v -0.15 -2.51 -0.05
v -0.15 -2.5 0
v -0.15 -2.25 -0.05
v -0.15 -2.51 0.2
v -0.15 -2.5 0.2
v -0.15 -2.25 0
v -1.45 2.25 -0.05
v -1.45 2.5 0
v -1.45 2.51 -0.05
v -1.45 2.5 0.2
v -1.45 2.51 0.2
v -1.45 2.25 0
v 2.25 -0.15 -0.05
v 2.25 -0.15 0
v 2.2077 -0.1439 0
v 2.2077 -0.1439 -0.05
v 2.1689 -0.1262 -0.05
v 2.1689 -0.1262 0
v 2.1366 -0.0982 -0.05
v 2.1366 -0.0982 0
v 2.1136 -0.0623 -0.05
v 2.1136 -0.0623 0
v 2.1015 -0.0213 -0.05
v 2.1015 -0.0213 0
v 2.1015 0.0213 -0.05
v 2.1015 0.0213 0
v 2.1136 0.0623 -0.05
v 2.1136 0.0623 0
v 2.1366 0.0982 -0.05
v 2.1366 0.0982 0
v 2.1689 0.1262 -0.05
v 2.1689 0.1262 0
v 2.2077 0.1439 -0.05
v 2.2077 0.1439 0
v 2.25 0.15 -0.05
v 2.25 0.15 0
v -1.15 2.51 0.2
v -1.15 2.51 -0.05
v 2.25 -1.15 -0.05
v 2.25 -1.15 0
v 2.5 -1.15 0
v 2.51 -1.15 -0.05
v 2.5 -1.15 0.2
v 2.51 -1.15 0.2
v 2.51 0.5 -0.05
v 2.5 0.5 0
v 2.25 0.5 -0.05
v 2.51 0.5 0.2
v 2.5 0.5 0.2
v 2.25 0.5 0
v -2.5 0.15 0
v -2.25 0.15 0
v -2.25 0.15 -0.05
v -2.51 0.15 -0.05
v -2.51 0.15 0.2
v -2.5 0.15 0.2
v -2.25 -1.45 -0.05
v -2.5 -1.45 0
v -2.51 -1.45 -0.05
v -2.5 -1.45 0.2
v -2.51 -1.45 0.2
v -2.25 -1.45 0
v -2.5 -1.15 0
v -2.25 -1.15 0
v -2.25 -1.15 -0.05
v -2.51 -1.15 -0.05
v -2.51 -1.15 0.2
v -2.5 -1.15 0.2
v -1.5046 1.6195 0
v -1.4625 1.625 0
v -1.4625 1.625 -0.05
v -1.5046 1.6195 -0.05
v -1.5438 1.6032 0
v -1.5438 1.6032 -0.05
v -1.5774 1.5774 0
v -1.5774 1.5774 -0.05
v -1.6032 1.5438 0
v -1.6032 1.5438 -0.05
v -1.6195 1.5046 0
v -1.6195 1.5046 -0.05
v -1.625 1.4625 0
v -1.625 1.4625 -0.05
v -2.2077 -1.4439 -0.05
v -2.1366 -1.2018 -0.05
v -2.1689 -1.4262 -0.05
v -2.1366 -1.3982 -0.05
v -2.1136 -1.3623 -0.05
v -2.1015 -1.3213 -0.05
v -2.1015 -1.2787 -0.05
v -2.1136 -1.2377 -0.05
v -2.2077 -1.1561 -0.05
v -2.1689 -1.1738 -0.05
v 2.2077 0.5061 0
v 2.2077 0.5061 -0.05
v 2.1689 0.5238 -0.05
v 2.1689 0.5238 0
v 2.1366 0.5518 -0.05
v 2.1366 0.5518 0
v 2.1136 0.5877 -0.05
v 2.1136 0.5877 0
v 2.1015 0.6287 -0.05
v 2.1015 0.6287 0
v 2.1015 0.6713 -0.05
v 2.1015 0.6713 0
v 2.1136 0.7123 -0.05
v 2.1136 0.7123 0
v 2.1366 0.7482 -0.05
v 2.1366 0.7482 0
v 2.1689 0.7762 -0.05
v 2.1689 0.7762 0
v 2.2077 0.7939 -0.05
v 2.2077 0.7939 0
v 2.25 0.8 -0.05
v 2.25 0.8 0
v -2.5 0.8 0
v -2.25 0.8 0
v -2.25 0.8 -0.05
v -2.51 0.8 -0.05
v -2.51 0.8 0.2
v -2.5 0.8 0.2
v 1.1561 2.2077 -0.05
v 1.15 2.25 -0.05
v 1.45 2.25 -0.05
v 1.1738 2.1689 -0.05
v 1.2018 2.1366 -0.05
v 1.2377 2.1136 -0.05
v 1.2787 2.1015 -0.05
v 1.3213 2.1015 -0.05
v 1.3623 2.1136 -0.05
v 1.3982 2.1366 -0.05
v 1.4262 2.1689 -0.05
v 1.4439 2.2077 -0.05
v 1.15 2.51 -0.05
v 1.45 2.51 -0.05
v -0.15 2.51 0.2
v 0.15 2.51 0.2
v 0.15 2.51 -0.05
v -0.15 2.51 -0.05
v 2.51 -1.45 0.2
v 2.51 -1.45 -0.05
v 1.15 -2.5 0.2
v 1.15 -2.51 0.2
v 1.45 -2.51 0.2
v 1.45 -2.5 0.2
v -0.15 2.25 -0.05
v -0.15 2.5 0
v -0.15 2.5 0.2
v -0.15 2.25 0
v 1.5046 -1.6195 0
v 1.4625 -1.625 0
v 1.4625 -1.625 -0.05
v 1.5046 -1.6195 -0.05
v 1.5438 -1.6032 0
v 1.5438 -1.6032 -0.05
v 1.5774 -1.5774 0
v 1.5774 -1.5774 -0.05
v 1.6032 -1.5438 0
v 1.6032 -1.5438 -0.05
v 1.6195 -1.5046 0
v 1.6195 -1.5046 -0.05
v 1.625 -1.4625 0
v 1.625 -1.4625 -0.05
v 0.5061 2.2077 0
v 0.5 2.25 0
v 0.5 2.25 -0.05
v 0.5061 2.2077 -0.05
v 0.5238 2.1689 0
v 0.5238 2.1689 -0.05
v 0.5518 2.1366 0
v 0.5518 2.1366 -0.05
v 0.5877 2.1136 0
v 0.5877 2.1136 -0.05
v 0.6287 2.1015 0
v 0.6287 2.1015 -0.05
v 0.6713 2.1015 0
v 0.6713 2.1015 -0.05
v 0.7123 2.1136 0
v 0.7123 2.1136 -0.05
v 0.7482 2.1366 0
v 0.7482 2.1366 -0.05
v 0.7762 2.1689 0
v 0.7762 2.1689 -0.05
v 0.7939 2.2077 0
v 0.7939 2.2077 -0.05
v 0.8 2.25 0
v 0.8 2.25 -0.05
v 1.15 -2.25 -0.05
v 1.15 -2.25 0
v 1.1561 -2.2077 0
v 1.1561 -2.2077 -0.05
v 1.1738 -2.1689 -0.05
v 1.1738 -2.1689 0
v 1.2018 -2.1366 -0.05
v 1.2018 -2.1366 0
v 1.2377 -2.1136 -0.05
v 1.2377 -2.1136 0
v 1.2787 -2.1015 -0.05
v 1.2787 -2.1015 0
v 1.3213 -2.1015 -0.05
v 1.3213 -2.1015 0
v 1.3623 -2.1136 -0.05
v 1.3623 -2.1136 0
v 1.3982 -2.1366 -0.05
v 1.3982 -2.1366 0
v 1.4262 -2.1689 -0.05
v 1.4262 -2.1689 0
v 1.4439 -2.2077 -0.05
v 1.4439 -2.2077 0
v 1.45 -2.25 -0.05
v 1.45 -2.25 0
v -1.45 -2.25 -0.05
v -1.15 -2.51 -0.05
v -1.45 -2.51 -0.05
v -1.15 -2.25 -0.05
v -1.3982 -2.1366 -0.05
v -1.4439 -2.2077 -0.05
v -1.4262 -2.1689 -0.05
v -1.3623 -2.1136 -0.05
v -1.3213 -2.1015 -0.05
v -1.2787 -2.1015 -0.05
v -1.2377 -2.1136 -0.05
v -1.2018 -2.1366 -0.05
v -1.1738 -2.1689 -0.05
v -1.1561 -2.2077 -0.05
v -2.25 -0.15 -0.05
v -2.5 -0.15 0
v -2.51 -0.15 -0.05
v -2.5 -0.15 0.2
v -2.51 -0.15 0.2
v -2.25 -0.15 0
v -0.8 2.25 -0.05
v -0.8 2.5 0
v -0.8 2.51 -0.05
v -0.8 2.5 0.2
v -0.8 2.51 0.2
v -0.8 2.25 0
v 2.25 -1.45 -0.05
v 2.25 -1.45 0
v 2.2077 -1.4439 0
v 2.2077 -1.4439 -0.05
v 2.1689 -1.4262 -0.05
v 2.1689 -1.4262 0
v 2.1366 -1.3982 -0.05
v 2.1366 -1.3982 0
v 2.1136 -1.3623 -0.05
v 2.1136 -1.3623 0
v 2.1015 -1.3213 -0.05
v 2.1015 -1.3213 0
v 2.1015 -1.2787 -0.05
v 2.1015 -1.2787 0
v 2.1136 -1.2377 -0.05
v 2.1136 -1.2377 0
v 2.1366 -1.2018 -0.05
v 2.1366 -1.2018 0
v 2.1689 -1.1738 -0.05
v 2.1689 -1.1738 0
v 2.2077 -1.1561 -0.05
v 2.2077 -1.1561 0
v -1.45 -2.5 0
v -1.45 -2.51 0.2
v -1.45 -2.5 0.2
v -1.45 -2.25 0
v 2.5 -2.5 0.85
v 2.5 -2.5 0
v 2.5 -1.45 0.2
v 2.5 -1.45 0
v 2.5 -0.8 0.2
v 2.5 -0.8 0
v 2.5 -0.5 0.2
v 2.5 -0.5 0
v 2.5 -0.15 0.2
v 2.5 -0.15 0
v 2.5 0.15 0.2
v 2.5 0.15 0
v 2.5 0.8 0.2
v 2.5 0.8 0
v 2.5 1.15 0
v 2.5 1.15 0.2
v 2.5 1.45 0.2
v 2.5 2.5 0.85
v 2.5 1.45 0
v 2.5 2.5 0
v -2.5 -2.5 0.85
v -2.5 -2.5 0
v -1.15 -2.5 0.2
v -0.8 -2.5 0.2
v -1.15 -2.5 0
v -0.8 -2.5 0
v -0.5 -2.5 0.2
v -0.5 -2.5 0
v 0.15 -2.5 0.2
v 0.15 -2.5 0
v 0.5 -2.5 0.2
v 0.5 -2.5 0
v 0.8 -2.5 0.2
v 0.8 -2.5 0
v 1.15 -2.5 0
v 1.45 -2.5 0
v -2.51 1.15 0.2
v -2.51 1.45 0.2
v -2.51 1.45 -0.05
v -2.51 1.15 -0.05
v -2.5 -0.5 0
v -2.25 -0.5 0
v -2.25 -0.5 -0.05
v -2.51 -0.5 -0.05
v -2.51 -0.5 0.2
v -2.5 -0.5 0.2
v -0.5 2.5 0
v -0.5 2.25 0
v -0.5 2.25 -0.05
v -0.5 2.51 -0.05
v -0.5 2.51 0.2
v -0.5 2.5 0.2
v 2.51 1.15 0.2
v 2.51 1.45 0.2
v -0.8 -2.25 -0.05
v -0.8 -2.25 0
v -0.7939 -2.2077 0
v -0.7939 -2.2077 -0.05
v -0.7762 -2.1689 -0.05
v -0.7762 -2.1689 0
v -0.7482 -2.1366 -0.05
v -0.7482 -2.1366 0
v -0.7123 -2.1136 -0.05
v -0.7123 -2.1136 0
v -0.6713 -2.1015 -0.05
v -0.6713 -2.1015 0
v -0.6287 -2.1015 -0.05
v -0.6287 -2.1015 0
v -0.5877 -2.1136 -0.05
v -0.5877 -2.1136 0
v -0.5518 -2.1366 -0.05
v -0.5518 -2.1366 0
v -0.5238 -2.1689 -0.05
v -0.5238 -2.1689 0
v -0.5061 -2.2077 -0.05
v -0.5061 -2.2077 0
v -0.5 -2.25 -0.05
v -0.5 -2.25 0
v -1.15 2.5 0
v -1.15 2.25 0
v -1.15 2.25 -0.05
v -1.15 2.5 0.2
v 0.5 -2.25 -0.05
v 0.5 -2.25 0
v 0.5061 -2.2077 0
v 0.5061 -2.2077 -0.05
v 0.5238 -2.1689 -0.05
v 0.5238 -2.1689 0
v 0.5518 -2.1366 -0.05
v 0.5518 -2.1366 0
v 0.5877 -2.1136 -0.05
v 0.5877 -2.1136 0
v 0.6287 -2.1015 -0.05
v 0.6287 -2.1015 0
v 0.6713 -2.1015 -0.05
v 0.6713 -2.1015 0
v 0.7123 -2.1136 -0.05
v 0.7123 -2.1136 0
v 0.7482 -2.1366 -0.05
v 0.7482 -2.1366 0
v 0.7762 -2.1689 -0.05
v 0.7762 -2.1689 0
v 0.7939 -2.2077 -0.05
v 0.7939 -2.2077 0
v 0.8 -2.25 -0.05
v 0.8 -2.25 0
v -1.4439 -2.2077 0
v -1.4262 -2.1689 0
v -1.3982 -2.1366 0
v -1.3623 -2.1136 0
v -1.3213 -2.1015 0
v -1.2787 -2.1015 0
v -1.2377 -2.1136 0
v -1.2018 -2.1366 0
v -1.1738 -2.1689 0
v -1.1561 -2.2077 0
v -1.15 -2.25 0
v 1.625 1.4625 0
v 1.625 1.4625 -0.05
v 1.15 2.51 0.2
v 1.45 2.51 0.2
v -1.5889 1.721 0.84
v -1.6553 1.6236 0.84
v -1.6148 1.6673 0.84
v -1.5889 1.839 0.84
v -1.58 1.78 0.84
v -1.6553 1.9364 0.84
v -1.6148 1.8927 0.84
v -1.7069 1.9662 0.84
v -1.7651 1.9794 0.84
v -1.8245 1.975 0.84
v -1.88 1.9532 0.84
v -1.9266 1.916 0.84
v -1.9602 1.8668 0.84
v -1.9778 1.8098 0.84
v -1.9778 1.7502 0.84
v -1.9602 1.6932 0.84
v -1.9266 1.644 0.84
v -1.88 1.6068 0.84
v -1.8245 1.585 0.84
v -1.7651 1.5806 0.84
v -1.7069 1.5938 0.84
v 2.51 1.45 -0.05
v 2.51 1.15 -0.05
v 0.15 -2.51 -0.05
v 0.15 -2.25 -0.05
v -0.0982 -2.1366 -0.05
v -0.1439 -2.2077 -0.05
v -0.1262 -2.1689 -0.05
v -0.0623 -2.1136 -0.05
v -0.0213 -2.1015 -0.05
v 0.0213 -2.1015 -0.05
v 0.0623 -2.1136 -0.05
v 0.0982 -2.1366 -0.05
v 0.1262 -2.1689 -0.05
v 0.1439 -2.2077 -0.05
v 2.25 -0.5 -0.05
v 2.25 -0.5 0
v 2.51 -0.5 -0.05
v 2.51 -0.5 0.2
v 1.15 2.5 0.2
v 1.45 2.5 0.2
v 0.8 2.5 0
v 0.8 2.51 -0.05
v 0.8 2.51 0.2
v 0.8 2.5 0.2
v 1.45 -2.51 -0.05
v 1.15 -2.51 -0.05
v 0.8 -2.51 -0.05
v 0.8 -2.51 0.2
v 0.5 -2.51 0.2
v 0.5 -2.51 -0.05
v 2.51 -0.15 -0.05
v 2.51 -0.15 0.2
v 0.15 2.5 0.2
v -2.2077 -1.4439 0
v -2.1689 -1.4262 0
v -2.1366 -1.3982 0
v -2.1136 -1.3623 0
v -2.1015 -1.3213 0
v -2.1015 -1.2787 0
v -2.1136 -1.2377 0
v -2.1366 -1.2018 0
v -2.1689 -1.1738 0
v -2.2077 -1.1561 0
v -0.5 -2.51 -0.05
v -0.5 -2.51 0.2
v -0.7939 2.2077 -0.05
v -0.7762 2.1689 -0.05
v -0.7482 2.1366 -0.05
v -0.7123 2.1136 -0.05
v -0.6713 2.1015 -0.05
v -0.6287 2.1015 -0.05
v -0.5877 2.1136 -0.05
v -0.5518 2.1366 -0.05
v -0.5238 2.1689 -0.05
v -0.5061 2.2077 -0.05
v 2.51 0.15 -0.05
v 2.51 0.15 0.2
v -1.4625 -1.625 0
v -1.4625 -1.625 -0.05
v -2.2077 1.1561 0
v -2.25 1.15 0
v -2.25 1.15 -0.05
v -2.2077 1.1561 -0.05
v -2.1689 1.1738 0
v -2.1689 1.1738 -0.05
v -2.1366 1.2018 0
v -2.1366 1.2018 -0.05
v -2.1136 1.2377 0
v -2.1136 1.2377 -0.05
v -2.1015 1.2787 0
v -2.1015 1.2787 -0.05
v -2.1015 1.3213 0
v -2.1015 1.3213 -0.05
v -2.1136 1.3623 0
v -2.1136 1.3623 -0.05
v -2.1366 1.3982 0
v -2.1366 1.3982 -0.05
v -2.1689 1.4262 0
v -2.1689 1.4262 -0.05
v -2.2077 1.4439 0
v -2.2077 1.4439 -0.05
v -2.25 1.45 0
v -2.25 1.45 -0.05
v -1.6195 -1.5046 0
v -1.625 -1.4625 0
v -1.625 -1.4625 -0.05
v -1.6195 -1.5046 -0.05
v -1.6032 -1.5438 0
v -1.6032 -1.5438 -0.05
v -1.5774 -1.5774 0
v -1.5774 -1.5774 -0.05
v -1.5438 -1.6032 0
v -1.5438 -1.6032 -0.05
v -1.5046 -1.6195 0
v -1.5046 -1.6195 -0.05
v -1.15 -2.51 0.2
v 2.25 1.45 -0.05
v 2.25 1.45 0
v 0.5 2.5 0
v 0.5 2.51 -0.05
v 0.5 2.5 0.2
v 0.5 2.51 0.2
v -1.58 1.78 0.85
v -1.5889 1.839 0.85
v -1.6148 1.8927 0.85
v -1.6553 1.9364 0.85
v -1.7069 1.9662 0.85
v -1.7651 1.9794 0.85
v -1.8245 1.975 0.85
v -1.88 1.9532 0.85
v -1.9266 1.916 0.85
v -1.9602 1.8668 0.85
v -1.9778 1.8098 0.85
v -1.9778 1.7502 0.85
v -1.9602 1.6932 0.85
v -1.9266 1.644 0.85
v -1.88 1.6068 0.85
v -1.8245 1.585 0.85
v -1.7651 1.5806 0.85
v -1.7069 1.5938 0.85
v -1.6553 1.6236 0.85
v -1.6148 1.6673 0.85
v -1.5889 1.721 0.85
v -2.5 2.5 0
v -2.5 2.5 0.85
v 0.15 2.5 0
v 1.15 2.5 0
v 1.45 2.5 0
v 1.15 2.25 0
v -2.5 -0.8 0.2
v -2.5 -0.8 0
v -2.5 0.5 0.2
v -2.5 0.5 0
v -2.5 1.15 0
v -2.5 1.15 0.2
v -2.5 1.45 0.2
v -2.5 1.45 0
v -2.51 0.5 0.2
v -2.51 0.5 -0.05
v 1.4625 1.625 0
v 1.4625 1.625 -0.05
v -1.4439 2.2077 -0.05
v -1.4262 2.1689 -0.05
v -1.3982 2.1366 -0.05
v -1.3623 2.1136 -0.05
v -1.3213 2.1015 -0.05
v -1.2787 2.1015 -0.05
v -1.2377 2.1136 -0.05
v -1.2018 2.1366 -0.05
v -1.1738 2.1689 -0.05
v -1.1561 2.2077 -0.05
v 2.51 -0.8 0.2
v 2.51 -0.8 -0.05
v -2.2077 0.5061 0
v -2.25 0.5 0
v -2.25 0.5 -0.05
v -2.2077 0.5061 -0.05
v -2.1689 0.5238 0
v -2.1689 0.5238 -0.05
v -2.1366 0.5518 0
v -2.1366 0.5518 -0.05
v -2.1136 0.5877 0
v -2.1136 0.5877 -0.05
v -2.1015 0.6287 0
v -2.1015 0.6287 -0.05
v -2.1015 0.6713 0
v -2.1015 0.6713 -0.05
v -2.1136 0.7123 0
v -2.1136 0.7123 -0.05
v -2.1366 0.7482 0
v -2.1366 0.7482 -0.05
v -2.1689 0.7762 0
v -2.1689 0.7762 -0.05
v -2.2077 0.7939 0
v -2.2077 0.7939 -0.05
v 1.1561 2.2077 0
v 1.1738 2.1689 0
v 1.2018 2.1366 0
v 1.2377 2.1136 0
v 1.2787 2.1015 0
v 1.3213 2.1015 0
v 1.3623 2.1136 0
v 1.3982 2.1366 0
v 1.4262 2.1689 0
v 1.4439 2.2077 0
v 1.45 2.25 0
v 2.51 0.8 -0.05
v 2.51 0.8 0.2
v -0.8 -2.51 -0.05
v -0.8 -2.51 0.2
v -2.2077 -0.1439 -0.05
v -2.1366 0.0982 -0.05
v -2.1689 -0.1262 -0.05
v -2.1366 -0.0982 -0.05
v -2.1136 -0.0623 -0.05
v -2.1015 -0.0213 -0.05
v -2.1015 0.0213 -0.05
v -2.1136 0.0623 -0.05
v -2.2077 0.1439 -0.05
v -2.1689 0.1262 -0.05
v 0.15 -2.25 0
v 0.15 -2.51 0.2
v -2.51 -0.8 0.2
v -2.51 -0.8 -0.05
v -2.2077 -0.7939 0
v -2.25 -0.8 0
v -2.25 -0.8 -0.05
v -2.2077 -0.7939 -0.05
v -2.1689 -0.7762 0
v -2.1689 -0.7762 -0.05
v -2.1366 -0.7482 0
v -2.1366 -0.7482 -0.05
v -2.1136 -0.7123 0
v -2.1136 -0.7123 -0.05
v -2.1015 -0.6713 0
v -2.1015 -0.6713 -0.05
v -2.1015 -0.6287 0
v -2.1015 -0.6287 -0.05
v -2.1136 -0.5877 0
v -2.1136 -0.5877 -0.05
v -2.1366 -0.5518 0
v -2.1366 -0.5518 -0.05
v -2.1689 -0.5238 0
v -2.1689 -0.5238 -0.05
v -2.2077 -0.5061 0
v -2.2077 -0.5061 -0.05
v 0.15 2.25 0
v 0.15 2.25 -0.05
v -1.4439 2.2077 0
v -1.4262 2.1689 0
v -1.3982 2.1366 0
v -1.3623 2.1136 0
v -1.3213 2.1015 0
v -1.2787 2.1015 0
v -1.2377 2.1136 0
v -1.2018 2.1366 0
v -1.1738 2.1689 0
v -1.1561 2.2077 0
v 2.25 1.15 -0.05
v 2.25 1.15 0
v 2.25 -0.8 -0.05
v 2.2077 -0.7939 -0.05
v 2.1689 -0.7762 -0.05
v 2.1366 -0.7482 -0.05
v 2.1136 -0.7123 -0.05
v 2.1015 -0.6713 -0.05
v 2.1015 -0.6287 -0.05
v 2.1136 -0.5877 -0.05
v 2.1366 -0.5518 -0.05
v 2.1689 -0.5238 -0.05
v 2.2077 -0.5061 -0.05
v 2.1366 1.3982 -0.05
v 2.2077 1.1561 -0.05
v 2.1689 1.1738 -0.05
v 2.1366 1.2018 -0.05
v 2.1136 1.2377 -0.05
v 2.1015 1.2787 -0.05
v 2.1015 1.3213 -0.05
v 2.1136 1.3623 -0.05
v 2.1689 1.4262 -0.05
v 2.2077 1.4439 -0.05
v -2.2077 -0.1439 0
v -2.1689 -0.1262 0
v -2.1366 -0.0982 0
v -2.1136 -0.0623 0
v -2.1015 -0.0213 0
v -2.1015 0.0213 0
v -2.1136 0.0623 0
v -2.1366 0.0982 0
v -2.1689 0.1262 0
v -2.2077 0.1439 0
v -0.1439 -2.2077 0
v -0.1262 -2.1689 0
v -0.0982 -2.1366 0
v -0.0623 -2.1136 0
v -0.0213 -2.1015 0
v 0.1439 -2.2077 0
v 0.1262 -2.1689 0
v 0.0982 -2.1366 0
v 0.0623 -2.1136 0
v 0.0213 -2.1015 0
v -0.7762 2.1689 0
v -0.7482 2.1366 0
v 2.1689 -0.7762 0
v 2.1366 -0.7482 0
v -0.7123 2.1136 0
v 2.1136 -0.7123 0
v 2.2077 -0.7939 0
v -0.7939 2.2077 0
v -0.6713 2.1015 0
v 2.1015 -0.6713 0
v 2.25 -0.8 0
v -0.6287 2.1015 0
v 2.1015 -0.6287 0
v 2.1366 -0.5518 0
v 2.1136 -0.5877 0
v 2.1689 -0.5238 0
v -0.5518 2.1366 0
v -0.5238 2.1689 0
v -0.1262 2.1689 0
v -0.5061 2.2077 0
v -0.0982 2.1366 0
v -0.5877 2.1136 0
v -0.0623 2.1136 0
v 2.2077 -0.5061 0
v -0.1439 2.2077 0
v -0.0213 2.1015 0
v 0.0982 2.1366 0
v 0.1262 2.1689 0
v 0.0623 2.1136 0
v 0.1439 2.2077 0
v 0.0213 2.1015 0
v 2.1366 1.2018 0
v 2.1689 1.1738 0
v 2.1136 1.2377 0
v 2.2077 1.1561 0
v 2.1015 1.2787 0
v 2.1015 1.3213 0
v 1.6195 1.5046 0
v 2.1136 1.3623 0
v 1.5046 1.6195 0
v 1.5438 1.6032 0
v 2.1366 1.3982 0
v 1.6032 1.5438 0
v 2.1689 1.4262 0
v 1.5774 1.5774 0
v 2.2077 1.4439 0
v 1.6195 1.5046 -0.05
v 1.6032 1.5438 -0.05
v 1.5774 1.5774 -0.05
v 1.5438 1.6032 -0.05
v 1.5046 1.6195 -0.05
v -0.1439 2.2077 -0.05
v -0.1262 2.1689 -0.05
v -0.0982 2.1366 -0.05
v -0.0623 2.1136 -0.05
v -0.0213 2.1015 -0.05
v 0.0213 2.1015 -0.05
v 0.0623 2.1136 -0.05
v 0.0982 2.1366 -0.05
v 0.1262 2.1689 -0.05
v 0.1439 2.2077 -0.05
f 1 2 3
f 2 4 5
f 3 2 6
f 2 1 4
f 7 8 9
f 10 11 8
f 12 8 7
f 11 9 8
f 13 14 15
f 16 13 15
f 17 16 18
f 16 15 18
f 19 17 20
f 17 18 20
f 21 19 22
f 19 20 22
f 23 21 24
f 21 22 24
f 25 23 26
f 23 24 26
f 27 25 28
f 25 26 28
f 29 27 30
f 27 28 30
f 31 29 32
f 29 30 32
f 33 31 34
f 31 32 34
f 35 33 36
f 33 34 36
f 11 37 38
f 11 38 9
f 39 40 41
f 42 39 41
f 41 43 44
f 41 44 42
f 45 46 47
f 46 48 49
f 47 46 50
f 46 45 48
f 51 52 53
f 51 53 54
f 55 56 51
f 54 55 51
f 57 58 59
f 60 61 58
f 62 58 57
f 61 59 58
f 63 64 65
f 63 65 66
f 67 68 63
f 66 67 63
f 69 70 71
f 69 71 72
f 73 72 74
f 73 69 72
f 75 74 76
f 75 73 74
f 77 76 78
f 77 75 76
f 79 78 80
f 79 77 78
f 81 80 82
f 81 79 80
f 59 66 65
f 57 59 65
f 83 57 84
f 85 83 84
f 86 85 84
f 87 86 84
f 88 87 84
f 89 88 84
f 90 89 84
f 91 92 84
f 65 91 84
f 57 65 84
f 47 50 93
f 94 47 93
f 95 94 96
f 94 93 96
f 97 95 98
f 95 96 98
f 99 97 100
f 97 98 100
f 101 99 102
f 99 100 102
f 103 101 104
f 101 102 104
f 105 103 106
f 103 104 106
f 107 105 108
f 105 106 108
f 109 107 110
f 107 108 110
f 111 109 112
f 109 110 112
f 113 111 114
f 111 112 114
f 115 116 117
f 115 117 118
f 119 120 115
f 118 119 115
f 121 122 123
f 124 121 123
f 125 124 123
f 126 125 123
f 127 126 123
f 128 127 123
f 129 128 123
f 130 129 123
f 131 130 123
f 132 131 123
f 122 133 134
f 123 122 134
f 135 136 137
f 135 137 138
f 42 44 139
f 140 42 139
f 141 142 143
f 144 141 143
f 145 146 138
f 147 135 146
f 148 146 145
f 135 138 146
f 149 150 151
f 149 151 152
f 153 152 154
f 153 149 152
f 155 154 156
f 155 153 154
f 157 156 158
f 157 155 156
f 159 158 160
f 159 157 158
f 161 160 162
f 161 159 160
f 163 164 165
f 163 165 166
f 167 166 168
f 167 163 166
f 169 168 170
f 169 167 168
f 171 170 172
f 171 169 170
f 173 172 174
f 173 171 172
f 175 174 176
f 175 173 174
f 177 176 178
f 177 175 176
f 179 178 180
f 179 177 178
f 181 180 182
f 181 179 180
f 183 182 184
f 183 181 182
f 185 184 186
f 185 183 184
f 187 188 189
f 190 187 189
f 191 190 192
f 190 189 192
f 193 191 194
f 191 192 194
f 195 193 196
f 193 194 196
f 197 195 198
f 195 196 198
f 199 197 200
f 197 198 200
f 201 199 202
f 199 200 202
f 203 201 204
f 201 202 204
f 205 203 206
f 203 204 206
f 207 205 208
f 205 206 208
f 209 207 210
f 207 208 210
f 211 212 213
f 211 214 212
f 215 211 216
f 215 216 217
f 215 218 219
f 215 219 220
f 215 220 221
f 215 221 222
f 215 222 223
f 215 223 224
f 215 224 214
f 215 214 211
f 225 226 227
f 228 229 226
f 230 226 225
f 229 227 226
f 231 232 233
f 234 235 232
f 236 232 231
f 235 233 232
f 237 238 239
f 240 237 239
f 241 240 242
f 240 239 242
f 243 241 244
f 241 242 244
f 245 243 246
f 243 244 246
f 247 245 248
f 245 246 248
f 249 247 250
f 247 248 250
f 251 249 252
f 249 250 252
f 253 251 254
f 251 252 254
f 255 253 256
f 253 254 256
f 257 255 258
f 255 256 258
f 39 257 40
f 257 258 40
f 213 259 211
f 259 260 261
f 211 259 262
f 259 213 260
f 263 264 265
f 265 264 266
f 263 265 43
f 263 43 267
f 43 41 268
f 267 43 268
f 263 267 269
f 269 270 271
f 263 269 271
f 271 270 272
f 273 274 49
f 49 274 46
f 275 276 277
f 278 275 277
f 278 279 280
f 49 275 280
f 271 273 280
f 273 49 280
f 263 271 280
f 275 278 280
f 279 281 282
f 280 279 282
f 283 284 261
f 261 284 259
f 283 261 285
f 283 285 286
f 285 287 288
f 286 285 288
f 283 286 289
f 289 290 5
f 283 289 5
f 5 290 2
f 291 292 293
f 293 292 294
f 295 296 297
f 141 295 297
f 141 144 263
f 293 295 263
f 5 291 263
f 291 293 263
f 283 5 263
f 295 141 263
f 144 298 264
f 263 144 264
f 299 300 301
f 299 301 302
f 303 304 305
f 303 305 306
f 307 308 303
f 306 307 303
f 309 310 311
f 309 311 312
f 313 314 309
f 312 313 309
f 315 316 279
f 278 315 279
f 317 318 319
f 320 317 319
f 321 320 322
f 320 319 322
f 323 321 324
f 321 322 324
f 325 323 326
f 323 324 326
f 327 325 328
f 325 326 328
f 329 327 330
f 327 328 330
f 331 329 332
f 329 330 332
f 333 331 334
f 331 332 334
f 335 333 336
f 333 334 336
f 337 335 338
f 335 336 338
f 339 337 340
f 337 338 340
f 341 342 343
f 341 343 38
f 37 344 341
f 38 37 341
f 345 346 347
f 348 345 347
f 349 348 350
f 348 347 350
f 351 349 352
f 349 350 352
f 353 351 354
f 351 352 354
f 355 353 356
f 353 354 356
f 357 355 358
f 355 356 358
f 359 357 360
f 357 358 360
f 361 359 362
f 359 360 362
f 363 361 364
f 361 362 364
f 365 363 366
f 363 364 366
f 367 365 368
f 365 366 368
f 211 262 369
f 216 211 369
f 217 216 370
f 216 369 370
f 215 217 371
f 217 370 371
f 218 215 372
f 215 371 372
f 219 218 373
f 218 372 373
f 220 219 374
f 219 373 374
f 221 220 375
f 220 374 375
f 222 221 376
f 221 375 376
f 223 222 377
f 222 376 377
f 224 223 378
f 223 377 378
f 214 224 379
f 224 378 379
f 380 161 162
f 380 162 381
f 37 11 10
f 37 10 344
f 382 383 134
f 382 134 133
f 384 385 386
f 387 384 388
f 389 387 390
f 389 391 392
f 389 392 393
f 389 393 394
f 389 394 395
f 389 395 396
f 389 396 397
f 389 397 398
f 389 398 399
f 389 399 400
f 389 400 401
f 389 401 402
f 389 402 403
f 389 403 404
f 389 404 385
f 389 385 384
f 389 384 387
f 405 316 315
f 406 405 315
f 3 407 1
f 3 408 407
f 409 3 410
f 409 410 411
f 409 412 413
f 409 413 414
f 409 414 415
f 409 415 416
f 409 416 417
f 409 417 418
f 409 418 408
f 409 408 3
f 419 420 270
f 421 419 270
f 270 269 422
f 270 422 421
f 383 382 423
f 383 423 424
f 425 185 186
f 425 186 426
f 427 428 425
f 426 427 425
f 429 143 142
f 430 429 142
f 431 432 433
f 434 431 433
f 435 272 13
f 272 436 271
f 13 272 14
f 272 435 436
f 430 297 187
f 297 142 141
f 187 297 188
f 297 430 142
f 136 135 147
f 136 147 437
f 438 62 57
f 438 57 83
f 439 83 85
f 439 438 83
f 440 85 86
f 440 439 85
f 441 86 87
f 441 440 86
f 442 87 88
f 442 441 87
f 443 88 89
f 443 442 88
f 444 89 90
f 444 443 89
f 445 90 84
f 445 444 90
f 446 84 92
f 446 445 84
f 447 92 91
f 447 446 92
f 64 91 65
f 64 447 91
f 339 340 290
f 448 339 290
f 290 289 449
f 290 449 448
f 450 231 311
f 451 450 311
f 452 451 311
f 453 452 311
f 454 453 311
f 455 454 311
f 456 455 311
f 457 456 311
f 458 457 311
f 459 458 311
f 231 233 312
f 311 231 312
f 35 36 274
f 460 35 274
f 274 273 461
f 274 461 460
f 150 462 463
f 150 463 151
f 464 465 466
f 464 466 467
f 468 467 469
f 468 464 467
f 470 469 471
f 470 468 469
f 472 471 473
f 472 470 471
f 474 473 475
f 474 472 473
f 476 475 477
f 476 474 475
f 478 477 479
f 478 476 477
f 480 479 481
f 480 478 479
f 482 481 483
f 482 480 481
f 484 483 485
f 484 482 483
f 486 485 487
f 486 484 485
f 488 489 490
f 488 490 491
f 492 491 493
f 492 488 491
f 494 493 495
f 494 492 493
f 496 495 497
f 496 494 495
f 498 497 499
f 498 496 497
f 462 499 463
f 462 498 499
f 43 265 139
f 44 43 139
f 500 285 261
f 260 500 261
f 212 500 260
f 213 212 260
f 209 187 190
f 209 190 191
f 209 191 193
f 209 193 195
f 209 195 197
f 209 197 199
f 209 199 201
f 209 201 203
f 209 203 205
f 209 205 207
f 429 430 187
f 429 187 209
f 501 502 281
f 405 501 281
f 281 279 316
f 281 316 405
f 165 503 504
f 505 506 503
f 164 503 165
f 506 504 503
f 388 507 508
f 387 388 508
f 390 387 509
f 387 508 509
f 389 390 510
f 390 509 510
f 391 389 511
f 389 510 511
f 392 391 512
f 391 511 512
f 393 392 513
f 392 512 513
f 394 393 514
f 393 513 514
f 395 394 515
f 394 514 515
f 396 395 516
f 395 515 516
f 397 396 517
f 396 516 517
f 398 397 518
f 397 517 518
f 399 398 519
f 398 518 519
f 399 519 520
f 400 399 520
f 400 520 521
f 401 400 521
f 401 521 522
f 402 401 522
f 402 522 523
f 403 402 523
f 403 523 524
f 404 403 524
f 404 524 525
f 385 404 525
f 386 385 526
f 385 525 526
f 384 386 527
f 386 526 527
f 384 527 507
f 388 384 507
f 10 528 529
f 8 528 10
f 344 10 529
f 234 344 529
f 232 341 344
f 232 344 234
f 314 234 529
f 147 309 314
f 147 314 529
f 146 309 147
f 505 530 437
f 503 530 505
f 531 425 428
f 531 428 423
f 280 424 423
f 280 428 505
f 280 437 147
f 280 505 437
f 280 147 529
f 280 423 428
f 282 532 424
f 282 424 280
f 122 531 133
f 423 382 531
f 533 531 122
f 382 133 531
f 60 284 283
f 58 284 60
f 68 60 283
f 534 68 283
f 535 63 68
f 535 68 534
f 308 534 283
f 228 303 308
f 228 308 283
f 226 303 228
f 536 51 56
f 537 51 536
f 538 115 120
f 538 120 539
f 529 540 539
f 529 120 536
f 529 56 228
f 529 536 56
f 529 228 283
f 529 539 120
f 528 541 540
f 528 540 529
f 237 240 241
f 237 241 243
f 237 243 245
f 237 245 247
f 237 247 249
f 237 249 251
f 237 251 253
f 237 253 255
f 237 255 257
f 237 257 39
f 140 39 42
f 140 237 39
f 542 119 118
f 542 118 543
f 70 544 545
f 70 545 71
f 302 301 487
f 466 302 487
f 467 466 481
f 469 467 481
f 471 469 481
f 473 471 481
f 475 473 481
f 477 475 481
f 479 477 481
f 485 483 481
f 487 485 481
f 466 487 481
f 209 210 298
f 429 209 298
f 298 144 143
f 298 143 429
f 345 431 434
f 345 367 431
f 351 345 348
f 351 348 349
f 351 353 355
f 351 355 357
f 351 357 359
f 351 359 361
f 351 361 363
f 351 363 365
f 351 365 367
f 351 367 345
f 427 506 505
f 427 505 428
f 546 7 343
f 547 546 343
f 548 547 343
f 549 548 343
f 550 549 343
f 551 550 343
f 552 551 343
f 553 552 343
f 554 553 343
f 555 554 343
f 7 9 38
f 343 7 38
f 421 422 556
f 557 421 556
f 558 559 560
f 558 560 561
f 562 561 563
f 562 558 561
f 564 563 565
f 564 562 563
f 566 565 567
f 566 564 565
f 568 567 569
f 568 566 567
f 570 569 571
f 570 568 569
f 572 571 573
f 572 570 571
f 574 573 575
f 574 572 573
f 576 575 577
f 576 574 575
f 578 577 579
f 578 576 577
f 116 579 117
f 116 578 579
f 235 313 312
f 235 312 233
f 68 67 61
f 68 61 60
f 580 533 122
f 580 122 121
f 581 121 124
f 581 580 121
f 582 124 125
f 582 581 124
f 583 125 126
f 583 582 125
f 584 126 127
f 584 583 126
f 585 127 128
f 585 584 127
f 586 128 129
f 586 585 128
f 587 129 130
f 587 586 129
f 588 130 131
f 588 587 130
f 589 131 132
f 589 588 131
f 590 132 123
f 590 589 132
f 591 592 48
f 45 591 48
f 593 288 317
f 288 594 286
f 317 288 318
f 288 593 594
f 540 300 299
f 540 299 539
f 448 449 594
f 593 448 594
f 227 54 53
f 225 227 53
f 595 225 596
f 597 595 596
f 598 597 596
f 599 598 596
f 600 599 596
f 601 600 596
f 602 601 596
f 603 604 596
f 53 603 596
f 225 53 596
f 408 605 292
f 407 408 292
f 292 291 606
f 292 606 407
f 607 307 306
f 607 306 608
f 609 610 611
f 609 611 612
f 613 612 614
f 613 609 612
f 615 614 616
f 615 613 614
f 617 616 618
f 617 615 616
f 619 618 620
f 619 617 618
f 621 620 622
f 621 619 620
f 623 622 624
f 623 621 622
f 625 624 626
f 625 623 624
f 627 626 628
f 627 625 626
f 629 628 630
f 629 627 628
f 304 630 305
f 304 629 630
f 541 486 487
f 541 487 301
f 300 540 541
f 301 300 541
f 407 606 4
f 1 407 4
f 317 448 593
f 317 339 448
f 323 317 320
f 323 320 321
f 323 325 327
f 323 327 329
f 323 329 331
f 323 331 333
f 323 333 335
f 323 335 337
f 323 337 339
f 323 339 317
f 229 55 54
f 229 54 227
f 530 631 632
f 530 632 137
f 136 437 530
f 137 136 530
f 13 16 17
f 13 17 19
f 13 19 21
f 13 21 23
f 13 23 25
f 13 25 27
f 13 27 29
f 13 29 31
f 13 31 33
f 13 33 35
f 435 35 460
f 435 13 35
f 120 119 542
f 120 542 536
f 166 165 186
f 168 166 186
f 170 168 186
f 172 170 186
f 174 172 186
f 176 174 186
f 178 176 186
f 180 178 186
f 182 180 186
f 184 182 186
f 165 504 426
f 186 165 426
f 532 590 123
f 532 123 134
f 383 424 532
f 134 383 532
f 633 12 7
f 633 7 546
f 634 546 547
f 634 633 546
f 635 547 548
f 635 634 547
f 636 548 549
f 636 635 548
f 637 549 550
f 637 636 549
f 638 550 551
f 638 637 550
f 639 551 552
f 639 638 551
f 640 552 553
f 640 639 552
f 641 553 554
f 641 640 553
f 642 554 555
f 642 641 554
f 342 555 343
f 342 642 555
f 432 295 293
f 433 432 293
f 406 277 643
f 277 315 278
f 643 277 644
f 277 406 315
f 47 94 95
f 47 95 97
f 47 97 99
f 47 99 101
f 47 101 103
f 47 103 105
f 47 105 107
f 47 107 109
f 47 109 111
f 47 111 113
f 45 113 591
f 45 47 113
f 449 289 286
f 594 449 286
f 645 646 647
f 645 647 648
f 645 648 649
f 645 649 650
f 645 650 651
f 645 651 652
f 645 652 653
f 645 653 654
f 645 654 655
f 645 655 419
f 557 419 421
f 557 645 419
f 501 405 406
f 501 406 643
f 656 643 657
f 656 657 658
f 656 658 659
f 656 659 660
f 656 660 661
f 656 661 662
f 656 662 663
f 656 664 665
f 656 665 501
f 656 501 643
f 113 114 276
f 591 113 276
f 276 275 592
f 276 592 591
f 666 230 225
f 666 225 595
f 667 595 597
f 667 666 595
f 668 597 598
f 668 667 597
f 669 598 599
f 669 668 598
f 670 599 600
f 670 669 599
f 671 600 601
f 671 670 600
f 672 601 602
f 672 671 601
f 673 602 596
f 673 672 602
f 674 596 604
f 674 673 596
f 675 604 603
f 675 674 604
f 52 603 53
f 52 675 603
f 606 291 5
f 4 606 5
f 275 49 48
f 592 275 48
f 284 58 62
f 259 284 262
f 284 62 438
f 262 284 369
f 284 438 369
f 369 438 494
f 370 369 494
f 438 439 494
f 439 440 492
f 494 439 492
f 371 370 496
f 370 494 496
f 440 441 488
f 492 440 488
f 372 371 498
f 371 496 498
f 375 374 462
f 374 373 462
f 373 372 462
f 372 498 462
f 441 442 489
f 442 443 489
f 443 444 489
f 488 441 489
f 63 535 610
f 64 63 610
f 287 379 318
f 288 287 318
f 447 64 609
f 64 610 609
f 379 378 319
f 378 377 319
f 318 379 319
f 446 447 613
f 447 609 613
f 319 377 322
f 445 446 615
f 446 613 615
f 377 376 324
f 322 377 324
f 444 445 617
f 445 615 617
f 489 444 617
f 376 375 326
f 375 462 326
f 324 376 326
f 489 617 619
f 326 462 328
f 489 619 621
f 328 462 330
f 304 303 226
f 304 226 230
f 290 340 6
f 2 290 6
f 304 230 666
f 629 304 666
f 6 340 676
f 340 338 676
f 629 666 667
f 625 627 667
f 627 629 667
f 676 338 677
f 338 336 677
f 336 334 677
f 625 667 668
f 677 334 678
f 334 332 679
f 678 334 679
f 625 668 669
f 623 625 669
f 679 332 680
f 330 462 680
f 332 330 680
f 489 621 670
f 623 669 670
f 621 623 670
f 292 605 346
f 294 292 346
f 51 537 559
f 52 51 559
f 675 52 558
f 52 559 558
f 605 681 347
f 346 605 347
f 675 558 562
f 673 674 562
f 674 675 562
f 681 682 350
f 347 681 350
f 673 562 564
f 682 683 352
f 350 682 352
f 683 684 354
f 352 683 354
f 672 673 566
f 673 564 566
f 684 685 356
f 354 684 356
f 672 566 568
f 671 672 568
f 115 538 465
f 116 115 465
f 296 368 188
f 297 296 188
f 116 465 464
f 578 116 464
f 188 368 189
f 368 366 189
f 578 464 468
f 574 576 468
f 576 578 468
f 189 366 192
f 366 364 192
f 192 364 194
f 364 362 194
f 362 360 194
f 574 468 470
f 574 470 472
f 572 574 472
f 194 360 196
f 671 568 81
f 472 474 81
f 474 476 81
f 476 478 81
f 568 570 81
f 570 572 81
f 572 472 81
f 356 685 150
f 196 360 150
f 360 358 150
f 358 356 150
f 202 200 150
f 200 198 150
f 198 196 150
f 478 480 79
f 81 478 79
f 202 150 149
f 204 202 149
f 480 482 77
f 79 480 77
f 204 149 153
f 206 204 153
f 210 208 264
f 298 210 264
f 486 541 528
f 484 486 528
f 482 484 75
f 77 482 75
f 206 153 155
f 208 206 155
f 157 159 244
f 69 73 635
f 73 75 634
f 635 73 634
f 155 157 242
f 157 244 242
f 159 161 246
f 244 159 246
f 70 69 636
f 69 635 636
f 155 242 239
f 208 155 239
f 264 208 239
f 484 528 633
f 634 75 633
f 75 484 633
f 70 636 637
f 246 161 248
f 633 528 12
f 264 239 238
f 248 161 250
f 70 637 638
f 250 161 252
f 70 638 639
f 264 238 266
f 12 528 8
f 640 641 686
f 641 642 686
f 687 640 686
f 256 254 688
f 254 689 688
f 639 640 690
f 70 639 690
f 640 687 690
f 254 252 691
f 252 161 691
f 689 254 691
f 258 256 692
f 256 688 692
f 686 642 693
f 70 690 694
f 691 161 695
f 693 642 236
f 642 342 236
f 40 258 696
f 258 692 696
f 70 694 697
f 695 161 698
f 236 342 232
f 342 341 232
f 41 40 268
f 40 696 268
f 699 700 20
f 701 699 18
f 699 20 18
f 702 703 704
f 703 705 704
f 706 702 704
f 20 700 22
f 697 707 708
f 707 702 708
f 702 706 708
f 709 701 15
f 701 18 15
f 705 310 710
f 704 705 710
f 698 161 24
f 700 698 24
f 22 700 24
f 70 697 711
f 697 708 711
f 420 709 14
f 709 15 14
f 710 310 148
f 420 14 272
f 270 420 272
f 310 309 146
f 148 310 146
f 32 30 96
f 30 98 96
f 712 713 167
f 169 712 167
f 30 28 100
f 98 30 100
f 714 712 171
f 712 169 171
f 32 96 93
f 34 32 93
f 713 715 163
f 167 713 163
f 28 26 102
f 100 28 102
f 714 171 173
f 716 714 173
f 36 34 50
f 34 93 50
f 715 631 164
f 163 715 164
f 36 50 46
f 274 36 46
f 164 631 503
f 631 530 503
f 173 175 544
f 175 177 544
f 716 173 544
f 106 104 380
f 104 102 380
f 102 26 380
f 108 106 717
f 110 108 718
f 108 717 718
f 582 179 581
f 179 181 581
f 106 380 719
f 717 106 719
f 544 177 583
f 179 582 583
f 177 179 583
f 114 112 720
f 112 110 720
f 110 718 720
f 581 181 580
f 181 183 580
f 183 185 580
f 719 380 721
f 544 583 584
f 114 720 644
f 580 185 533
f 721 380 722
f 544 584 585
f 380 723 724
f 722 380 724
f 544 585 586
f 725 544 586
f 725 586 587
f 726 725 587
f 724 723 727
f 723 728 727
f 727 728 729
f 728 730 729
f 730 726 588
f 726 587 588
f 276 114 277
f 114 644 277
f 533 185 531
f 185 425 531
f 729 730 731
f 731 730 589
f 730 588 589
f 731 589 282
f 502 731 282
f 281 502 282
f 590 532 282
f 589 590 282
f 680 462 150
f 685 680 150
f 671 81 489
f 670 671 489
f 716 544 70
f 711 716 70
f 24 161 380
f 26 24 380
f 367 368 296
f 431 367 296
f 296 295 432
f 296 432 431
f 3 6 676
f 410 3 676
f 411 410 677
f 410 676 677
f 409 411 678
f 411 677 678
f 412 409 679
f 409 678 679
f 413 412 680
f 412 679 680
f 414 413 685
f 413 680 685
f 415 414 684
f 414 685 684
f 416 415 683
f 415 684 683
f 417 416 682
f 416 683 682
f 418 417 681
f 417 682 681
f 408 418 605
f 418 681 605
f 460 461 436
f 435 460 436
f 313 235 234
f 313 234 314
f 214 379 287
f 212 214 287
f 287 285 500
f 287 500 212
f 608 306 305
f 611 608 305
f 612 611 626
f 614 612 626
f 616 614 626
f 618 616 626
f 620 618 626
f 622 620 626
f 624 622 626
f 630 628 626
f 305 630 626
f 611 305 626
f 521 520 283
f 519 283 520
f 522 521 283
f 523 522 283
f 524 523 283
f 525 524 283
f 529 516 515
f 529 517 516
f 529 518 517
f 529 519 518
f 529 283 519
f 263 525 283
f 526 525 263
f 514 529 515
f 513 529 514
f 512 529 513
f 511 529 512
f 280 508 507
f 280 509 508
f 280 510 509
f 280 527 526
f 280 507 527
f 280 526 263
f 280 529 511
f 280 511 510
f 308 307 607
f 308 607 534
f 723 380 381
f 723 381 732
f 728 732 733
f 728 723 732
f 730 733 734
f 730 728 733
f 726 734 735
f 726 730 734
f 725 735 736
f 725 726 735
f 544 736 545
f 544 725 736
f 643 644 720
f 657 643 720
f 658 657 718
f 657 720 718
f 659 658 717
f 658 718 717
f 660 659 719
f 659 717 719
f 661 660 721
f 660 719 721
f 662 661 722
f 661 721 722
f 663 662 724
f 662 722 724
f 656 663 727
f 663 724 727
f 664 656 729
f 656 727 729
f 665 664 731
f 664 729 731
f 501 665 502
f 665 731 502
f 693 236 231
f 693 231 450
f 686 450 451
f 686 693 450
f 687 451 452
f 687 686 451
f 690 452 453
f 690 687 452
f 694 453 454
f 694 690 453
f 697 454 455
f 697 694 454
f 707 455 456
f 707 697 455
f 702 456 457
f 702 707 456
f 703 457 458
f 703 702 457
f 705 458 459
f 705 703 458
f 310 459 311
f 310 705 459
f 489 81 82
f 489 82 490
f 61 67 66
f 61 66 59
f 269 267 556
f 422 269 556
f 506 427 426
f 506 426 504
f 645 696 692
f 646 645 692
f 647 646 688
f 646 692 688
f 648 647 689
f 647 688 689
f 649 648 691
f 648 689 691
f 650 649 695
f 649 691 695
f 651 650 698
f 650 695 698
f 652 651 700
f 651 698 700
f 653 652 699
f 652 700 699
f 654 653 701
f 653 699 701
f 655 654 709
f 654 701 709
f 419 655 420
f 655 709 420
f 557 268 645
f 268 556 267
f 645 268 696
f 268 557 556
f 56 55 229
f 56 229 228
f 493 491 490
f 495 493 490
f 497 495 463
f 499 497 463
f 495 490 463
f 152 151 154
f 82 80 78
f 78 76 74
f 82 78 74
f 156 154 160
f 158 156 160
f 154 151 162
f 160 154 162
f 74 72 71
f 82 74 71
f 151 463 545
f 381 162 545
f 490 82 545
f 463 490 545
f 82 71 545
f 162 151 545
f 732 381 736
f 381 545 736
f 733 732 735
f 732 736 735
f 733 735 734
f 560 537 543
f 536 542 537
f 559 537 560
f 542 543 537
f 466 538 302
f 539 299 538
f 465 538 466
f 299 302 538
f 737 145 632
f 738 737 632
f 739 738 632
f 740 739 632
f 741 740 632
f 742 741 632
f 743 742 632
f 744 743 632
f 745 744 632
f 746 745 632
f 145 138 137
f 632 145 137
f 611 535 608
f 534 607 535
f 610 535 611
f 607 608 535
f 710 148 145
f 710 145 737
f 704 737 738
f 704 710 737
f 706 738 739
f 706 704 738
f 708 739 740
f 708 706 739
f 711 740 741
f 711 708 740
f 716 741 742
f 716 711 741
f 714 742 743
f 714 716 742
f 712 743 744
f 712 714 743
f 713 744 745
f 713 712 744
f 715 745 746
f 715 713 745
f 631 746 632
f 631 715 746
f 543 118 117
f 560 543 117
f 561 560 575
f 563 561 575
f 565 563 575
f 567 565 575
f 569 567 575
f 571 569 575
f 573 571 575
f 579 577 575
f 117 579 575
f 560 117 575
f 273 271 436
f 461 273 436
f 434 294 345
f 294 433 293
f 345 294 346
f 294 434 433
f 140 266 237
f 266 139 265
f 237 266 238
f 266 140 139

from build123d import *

# Parameters (mm, degrees)
SKETCH1_W            = 5
SKETCH1_H            = 5
BOSS_EXTRUDE1_DEPTH  = 0.85
SKETCH2_R            = 0.2
CUT_EXTRUDE1_DEPTH   = 0.01
BOSS_EXTRUDE2_DEPTH  = 0.05
BOSS_EXTRUDE3_START  = -0.2
BOSS_EXTRUDE3_DEPTH  = 0.25
LPATTERN1_COUNT      = 5
LPATTERN1_PITCH      = 0.65
MIRROR1_START        = -0.2
MIRROR1_COPY_1_DEPTH = 0.25
MIRROR1_COPY_2_DEPTH = 0.25
MIRROR1_COPY_3_DEPTH = 0.25
MIRROR1_COPY_4_DEPTH = 0.25
BOSS_EXTRUDE4_START  = -0.2
BOSS_EXTRUDE4_DEPTH  = 0.25
LPATTERN2_COUNT      = 5
LPATTERN2_PITCH      = 0.65
MIRROR2_START        = -0.2
MIRROR2_COPY_1_DEPTH = 0.25
MIRROR2_COPY_2_DEPTH = 0.25
MIRROR2_COPY_3_DEPTH = 0.25
MIRROR2_COPY_4_DEPTH = 0.25


with BuildPart() as part:
    # Sketch1 → Boss-Extrude1 (new body)
    with BuildSketch(Plane.XY):
        Rectangle(SKETCH1_W, SKETCH1_H)
    extrude(amount=BOSS_EXTRUDE1_DEPTH)

    # Sketch2 → Cut-Extrude1 (cut)
    with BuildSketch(Plane.XY.offset(0.85)):
        with Locations((-1.78, 1.78)):
            Circle(SKETCH2_R)
    extrude(amount=-CUT_EXTRUDE1_DEPTH, mode=Mode.SUBTRACT)

    # Sketch3 → Boss-Extrude2 (add)
    with BuildSketch(Plane(origin=(0, 0, 0), x_dir=(-1, 0, 0), z_dir=(0, 0, -1))):
        with BuildLine():
            Line((1.4625, -1.625), (-1.4625, -1.625))
            ThreePointArc((-1.4625, -1.625), (-1.577404852, -1.577404852), (-1.625, -1.4625))
            Line((-1.625, -1.4625), (-1.625, 1.4625))
            ThreePointArc((-1.625, 1.4625), (-1.577404852, 1.577404852), (-1.4625, 1.625))
            Line((-1.4625, 1.625), (1.4625, 1.625))
            ThreePointArc((1.4625, 1.625), (1.577404852, 1.577404852), (1.625, 1.4625))
            Line((1.625, 1.4625), (1.625, -1.4625))
            ThreePointArc((1.625, -1.4625), (1.577404852, -1.577404852), (1.4625, -1.625))
        make_face()
    extrude(amount=BOSS_EXTRUDE2_DEPTH)

    # Sketch5 → Boss-Extrude3 (add)
    with BuildSketch(Plane(origin=(0, 0, 0), x_dir=(-1, 0, 0), z_dir=(0, 0, -1)).offset(BOSS_EXTRUDE3_START)):
        with BuildLine():
            Line((2.25, 1.45), (2.5, 1.45))
            Line((2.5, 1.45), (2.51, 1.45))
            Line((2.51, 1.45), (2.51, 1.15))
            Line((2.51, 1.15), (2.5, 1.15))
            Line((2.5, 1.15), (2.25, 1.15))
            ThreePointArc((2.25, 1.15), (2.1, 1.3), (2.25, 1.45))
        make_face()
    boss_extrude3 = extrude(amount=BOSS_EXTRUDE3_DEPTH)

    # LPattern1: Boss-Extrude3 ×5
    with Locations(*[(0, -i * LPATTERN1_PITCH, 0) for i in range(1, LPATTERN1_COUNT)]):
        add(boss_extrude3)

    # Mirror1: Boss-Extrude3 across plane
    add(boss_extrude3.mirror(Plane(origin=(0, 0, 0), x_dir=(0, 0, 1), z_dir=(1, 0, 0))))

    # Mirror1 copy 1 sketch → Mirror1 copy 1 (add)
    with BuildSketch(Plane(origin=(0, -0.65, 0), x_dir=(1, 0, 0), z_dir=(0, 0, -1)).offset(MIRROR1_START)):
        with BuildLine():
            Line((2.25, -1.45), (2.5, -1.45))
            Line((2.5, -1.45), (2.51, -1.45))
            Line((2.51, -1.45), (2.51, -1.15))
            Line((2.51, -1.15), (2.5, -1.15))
            Line((2.5, -1.15), (2.25, -1.15))
            ThreePointArc((2.25, -1.15), (2.1, -1.3), (2.25, -1.45))
        make_face()
    extrude(amount=MIRROR1_COPY_1_DEPTH)

    # Mirror1 copy 2 sketch → Mirror1 copy 2 (add)
    with BuildSketch(Plane(origin=(0, -1.3, 0), x_dir=(1, 0, 0), z_dir=(0, 0, -1)).offset(MIRROR1_START)):
        with BuildLine():
            Line((2.25, -1.45), (2.5, -1.45))
            Line((2.5, -1.45), (2.51, -1.45))
            Line((2.51, -1.45), (2.51, -1.15))
            Line((2.51, -1.15), (2.5, -1.15))
            Line((2.5, -1.15), (2.25, -1.15))
            ThreePointArc((2.25, -1.15), (2.1, -1.3), (2.25, -1.45))
        make_face()
    extrude(amount=MIRROR1_COPY_2_DEPTH)

    # Mirror1 copy 3 sketch → Mirror1 copy 3 (add)
    with BuildSketch(Plane(origin=(0, -1.95, 0), x_dir=(1, 0, 0), z_dir=(0, 0, -1)).offset(MIRROR1_START)):
        with BuildLine():
            Line((2.25, -1.45), (2.5, -1.45))
            Line((2.5, -1.45), (2.51, -1.45))
            Line((2.51, -1.45), (2.51, -1.15))
            Line((2.51, -1.15), (2.5, -1.15))
            Line((2.5, -1.15), (2.25, -1.15))
            ThreePointArc((2.25, -1.15), (2.1, -1.3), (2.25, -1.45))
        make_face()
    extrude(amount=MIRROR1_COPY_3_DEPTH)

    # Mirror1 copy 4 sketch → Mirror1 copy 4 (add)
    with BuildSketch(Plane(origin=(0, -2.6, 0), x_dir=(1, 0, 0), z_dir=(0, 0, -1)).offset(MIRROR1_START)):
        with BuildLine():
            Line((2.25, -1.45), (2.5, -1.45))
            Line((2.5, -1.45), (2.51, -1.45))
            Line((2.51, -1.45), (2.51, -1.15))
            Line((2.51, -1.15), (2.5, -1.15))
            Line((2.5, -1.15), (2.25, -1.15))
            ThreePointArc((2.25, -1.15), (2.1, -1.3), (2.25, -1.45))
        make_face()
    extrude(amount=MIRROR1_COPY_4_DEPTH)

    # Sketch6 → Boss-Extrude4 (add)
    with BuildSketch(Plane(origin=(0, 0, 0), x_dir=(-1, 0, 0), z_dir=(0, 0, -1)).offset(BOSS_EXTRUDE4_START)):
        with BuildLine():
            Line((-1.45, 2.51), (-1.15, 2.51))
            Line((-1.15, 2.51), (-1.15, 2.5))
            Line((-1.15, 2.5), (-1.15, 2.25))
            ThreePointArc((-1.15, 2.25), (-1.3, 2.1), (-1.45, 2.25))
            Line((-1.45, 2.25), (-1.45, 2.5))
            Line((-1.45, 2.5), (-1.45, 2.51))
        make_face()
    boss_extrude4 = extrude(amount=BOSS_EXTRUDE4_DEPTH)

    # LPattern2: Boss-Extrude4 ×5
    with Locations(*[(-i * LPATTERN2_PITCH, 0, 0) for i in range(1, LPATTERN2_COUNT)]):
        add(boss_extrude4)

    # Mirror2: Boss-Extrude4 across plane
    add(boss_extrude4.mirror(Plane.ZX))

    # Mirror2 copy 1 sketch → Mirror2 copy 1 (add)
    with BuildSketch(Plane(origin=(-0.65, 0, 0), x_dir=(-1, 0, 0), z_dir=(0, 0, -1)).offset(MIRROR2_START)):
        with BuildLine():
            Line((-1.45, -2.51), (-1.15, -2.51))
            Line((-1.15, -2.51), (-1.15, -2.5))
            Line((-1.15, -2.5), (-1.15, -2.25))
            ThreePointArc((-1.15, -2.25), (-1.3, -2.1), (-1.45, -2.25))
            Line((-1.45, -2.25), (-1.45, -2.5))
            Line((-1.45, -2.5), (-1.45, -2.51))
        make_face()
    extrude(amount=MIRROR2_COPY_1_DEPTH)

    # Mirror2 copy 2 sketch → Mirror2 copy 2 (add)
    with BuildSketch(Plane(origin=(-1.3, 0, 0), x_dir=(-1, 0, 0), z_dir=(0, 0, -1)).offset(MIRROR2_START)):
        with BuildLine():
            Line((-1.45, -2.51), (-1.15, -2.51))
            Line((-1.15, -2.51), (-1.15, -2.5))
            Line((-1.15, -2.5), (-1.15, -2.25))
            ThreePointArc((-1.15, -2.25), (-1.3, -2.1), (-1.45, -2.25))
            Line((-1.45, -2.25), (-1.45, -2.5))
            Line((-1.45, -2.5), (-1.45, -2.51))
        make_face()
    extrude(amount=MIRROR2_COPY_2_DEPTH)

    # Mirror2 copy 3 sketch → Mirror2 copy 3 (add)
    with BuildSketch(Plane(origin=(-1.95, 0, 0), x_dir=(-1, 0, 0), z_dir=(0, 0, -1)).offset(MIRROR2_START)):
        with BuildLine():
            Line((-1.45, -2.51), (-1.15, -2.51))
            Line((-1.15, -2.51), (-1.15, -2.5))
            Line((-1.15, -2.5), (-1.15, -2.25))
            ThreePointArc((-1.15, -2.25), (-1.3, -2.1), (-1.45, -2.25))
            Line((-1.45, -2.25), (-1.45, -2.5))
            Line((-1.45, -2.5), (-1.45, -2.51))
        make_face()
    extrude(amount=MIRROR2_COPY_3_DEPTH)

    # Mirror2 copy 4 sketch → Mirror2 copy 4 (add)
    with BuildSketch(Plane(origin=(-2.6, 0, 0), x_dir=(-1, 0, 0), z_dir=(0, 0, -1)).offset(MIRROR2_START)):
        with BuildLine():
            Line((-1.45, -2.51), (-1.15, -2.51))
            Line((-1.15, -2.51), (-1.15, -2.5))
            Line((-1.15, -2.5), (-1.15, -2.25))
            ThreePointArc((-1.15, -2.25), (-1.3, -2.1), (-1.45, -2.25))
            Line((-1.45, -2.25), (-1.45, -2.5))
            Line((-1.45, -2.5), (-1.45, -2.51))
        make_face()
    extrude(amount=MIRROR2_COPY_4_DEPTH)


solid = part.part
